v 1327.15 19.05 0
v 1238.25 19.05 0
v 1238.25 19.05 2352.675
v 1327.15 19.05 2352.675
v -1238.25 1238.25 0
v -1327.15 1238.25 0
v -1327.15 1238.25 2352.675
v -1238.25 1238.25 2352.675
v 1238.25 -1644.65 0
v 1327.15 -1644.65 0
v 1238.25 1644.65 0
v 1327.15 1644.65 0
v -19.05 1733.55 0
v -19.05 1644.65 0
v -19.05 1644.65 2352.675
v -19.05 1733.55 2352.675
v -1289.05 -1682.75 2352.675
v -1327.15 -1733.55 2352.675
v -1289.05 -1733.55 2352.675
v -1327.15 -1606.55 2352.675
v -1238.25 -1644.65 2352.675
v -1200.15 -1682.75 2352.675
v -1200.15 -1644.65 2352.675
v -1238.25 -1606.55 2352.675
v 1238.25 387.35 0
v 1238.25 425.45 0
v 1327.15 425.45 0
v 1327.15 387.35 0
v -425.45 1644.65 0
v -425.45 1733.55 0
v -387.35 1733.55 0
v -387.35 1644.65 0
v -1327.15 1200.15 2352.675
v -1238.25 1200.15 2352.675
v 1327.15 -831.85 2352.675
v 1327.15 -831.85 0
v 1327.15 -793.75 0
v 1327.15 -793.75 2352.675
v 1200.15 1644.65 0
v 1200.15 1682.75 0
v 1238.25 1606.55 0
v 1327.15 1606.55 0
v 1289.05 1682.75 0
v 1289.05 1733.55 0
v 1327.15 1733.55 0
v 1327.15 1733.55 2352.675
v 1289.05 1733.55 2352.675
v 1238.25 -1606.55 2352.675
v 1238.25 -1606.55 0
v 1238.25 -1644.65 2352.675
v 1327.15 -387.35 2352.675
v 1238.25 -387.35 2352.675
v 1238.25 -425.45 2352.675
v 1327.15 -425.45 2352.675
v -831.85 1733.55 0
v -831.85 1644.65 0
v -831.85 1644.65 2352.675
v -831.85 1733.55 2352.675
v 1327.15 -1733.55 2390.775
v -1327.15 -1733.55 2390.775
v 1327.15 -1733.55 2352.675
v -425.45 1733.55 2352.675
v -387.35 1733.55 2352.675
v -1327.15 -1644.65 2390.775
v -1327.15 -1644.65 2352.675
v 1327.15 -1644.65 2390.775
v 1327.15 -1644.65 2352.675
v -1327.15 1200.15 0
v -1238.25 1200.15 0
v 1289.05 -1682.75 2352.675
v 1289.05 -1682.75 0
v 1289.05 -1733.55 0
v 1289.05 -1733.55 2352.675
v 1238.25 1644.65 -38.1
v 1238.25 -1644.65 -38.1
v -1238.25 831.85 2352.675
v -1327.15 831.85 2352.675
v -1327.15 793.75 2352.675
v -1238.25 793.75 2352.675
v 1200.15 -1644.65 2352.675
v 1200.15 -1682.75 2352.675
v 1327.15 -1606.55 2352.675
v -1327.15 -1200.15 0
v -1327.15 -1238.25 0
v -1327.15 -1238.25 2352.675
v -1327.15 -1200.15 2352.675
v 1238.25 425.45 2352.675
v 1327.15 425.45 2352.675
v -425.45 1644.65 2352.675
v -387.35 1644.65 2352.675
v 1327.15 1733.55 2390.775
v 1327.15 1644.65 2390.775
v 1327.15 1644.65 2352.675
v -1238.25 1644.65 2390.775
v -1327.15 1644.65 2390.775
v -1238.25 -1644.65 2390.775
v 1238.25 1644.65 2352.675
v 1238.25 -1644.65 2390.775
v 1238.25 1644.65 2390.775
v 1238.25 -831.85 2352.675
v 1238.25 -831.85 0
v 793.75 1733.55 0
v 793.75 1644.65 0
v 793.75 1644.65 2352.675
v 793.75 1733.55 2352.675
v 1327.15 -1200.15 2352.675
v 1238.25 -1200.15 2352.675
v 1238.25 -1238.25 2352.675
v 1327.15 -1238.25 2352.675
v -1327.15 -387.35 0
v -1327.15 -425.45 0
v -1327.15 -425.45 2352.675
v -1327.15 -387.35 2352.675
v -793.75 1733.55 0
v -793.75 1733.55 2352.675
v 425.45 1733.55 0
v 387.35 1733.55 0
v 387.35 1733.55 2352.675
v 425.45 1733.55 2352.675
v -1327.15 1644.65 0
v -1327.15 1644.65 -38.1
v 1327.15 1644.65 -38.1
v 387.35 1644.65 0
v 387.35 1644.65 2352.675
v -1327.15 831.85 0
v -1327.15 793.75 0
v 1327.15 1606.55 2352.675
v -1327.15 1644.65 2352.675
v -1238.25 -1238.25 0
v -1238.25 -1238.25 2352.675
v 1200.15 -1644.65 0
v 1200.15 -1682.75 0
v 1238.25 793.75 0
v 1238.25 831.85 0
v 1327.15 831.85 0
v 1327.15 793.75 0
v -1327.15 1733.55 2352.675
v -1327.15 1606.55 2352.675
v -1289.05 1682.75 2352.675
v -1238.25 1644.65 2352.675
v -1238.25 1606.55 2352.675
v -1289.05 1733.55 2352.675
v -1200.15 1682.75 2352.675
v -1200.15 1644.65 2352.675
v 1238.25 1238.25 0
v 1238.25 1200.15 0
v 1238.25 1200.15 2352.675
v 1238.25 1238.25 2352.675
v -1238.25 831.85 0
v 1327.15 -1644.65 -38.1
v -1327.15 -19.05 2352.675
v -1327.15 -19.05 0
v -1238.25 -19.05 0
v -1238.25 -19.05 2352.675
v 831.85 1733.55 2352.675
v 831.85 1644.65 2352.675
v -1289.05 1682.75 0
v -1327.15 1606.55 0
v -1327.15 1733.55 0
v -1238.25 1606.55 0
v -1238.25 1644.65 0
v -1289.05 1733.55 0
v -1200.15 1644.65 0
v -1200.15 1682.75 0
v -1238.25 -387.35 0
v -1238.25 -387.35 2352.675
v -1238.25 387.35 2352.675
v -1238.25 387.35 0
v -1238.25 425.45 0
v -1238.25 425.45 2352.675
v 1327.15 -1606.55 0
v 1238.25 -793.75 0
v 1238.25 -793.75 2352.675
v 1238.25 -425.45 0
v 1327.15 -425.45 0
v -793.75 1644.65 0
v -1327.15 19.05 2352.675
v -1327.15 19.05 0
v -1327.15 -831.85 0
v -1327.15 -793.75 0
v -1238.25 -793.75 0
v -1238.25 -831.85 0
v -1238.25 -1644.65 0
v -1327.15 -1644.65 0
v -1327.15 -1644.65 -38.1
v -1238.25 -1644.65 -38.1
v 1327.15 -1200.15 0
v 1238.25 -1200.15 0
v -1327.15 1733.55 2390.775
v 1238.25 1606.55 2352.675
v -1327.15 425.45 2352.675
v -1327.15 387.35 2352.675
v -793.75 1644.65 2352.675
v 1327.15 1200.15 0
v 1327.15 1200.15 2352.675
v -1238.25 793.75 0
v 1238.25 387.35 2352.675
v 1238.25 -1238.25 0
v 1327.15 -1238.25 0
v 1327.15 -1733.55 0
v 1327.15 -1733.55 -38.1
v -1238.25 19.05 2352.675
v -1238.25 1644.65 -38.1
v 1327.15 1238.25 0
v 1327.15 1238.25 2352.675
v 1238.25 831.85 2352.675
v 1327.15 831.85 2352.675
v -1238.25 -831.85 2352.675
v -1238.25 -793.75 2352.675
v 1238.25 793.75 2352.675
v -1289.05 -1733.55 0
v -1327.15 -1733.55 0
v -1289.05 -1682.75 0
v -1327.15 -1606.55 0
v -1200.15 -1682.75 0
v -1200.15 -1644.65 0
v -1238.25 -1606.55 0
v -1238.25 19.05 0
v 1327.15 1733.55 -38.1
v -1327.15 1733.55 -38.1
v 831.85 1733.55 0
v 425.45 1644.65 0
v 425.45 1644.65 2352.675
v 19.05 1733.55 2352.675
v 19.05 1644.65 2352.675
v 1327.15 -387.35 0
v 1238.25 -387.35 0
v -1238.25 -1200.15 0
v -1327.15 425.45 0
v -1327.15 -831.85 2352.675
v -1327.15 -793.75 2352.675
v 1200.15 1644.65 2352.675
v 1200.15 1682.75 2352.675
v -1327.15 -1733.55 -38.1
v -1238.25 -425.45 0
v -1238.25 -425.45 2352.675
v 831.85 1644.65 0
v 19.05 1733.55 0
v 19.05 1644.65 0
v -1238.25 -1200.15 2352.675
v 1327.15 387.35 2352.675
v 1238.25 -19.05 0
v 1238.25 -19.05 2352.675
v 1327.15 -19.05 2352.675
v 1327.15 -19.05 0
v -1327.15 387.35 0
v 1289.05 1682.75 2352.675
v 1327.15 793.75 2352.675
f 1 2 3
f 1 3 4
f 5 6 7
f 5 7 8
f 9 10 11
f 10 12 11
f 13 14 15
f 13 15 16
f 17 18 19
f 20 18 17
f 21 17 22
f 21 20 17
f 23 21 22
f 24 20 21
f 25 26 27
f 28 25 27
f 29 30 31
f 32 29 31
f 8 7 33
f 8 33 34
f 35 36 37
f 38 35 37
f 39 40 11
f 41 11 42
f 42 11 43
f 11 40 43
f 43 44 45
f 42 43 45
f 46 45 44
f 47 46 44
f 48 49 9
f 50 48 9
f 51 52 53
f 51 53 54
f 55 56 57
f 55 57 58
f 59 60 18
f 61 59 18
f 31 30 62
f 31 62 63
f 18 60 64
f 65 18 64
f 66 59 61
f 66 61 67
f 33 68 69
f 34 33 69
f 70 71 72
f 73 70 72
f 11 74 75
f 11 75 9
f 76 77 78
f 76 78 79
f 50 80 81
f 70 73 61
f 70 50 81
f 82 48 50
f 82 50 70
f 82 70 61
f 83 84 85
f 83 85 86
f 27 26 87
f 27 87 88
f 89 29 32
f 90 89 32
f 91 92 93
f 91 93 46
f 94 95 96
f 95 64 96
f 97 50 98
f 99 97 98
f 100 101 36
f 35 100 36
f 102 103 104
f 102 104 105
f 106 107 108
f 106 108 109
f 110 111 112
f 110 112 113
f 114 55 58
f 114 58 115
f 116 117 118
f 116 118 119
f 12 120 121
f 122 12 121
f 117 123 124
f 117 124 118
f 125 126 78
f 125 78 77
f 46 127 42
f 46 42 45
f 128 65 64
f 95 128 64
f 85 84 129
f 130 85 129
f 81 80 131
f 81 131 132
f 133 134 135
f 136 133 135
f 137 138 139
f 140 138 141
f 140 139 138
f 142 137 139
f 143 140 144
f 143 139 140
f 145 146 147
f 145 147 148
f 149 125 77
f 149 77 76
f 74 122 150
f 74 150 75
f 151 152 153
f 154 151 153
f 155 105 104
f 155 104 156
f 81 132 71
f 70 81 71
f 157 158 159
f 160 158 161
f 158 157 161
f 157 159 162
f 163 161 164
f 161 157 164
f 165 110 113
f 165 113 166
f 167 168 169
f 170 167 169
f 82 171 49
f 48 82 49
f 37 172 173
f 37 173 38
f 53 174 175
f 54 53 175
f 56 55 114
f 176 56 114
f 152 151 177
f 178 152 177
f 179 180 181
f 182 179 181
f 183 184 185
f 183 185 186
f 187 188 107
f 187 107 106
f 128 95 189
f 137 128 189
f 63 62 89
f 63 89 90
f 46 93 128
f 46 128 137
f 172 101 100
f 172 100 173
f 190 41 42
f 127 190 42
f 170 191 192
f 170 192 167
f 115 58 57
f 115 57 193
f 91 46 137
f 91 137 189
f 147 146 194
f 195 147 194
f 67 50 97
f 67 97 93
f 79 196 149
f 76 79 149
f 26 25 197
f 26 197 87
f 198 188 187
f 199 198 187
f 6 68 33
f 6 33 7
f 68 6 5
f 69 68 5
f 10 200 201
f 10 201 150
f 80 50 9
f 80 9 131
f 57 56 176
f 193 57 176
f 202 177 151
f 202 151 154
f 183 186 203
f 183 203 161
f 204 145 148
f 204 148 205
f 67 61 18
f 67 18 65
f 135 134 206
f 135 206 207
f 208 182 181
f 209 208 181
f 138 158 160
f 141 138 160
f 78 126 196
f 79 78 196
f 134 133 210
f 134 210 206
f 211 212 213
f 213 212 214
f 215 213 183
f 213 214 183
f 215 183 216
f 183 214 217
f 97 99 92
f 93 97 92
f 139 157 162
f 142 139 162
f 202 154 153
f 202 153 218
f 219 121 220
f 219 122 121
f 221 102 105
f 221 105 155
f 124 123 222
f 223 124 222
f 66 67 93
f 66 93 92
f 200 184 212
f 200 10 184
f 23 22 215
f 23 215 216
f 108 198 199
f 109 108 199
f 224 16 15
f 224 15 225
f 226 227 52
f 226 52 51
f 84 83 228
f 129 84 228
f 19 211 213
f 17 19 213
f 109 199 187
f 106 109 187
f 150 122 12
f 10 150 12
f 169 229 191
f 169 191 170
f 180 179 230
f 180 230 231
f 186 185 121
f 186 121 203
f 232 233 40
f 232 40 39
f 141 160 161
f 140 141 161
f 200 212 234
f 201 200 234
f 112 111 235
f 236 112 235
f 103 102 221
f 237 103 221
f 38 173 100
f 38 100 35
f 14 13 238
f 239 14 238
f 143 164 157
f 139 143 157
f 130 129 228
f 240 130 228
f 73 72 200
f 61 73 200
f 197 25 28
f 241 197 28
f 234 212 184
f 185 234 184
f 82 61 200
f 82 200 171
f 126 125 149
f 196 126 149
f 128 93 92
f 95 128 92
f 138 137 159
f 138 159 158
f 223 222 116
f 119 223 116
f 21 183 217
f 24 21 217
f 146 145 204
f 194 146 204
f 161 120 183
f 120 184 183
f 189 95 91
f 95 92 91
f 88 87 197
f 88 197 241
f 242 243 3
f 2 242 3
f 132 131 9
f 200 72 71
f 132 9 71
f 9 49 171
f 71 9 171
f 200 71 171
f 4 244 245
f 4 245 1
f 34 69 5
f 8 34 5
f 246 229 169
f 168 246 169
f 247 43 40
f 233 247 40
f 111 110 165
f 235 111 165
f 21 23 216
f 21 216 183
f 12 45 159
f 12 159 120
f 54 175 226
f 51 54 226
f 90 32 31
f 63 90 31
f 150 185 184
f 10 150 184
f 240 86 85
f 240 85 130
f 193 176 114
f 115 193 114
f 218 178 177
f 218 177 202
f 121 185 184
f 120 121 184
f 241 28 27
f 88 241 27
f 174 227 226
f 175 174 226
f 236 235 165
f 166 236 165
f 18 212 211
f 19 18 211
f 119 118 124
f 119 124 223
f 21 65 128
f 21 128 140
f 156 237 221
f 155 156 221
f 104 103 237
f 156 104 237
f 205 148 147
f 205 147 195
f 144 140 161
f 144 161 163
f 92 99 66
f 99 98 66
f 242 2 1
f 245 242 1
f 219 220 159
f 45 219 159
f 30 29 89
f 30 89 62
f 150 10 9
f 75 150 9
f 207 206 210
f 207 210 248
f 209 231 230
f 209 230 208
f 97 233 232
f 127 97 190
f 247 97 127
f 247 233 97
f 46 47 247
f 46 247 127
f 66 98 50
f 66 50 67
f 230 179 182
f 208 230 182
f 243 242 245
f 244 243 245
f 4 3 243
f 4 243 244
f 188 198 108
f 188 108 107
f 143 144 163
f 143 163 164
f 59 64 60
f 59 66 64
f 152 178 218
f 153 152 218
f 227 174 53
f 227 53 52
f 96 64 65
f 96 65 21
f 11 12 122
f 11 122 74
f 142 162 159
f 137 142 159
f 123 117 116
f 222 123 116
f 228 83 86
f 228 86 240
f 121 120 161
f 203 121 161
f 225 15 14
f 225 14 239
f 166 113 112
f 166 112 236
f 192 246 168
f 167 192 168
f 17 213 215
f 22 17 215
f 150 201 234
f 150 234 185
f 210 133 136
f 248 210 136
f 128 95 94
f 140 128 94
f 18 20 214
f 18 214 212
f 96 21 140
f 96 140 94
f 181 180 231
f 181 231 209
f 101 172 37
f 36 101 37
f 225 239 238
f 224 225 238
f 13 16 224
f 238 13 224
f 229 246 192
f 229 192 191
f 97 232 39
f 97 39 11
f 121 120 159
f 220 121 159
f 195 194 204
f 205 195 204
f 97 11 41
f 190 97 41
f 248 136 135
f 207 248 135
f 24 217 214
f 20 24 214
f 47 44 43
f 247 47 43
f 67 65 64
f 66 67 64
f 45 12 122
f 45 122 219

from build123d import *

# Parameters (mm, degrees)
F1_DEPTH       = 2352.675
F0_W           = 38.1
F0_H           = 88.9
F0_W_2         = 88.9
F0_H_2         = 38.1
F2_W           = 88.9
F2_H           = 38.1
F3_DEPTH       = 3251.2
F3_DEPTH_BACK  = 38.1
F4_W           = 88.9
F4_H           = 38.1
F5_DEPTH       = 3251.2
F5_DEPTH_BACK  = 38.1
F7_DEPTH       = 2616.2
F7_DEPTH_BACK  = 38.1
F9_DEPTH       = 2616.2
F9_DEPTH_BACK  = 38.1
F10_W          = 88.9
F10_H          = 38.1
F11_DEPTH      = 3251.2
F11_DEPTH_BACK = 38.1
F12_W          = 88.9
F12_H          = 38.1
F13_DEPTH      = 3251.2
F13_DEPTH_BACK = 38.1
F15_DEPTH      = 2616.2
F15_DEPTH_BACK = 38.1
F16_W          = 88.9
F16_H          = 38.1
F17_DEPTH      = 2616.2
F17_DEPTH_BACK = 38.1


with BuildPart() as f1:
    # F0 (on Top) → F1 (new body)
    with BuildSketch(Plane.XY):
        Polygon((-1327.15, 1606.55), (-1238.25, 1606.55), (-1238.25, 1625.6), (-1238.25, 1644.65), (-1289.05, 1644.65), (-1327.15, 1644.65), align=None)
        Polygon((-1327.15, 1733.55), (-1327.15, 1644.65), (-1289.05, 1644.65), (-1289.05, 1682.75), (-1289.05, 1733.55), align=None)
        Polygon((-1289.05, 1644.65), (-1238.25, 1644.65), (-1200.15, 1644.65), (-1200.15, 1682.75), (-1289.05, 1682.75), align=None)
    extrude(amount=F1_DEPTH)


with BuildPart() as f1b:
    # F0 (on Top) → F1, piece 2 (new body)
    with BuildSketch(Plane.XY):
        with Locations((-812.8, 1689.1)):
            Rectangle(F0_W, F0_H)
    extrude(amount=F1_DEPTH)


with BuildPart() as f1c:
    # F0 (on Top) → F1, piece 3 (new body)
    with BuildSketch(Plane.XY):
        with Locations((-406.4, 1689.1)):
            Rectangle(F0_W, F0_H)
    extrude(amount=F1_DEPTH)


with BuildPart() as f1d:
    # F0 (on Top) → F1, piece 4 (new body)
    with BuildSketch(Plane.XY):
        with Locations((0, 1689.1)):
            Rectangle(F0_W, F0_H)
    extrude(amount=F1_DEPTH)


with BuildPart() as f1e:
    # F0 (on Top) → F1, piece 5 (new body)
    with BuildSketch(Plane.XY):
        with Locations((406.4, 1689.1)):
            Rectangle(F0_W, F0_H)
    extrude(amount=F1_DEPTH)


with BuildPart() as f1f:
    # F0 (on Top) → F1, piece 6 (new body)
    with BuildSketch(Plane.XY):
        Polygon((1200.15, 1644.65), (1238.25, 1644.65), (1282.7, 1644.65), (1289.05, 1644.65), (1289.05, 1682.75), (1200.15, 1682.75), align=None)
        Polygon((1289.05, 1644.65), (1327.15, 1644.65), (1327.15, 1733.55), (1289.05, 1733.55), (1289.05, 1682.75), align=None)
        Polygon((1238.25, 1644.65), (1238.25, 1606.55), (1327.15, 1606.55), (1327.15, 1644.65), (1289.05, 1644.65), (1282.7, 1644.65), align=None)
    extrude(amount=F1_DEPTH)


with BuildPart() as f1g:
    # F0 (on Top) → F1, piece 7 (new body)
    with BuildSketch(Plane.XY):
        with Locations((1282.7, 1219.2)):
            Rectangle(F0_W_2, F0_H_2)
    extrude(amount=F1_DEPTH)


with BuildPart() as f1h:
    # F0 (on Top) → F1, piece 8 (new body)
    with BuildSketch(Plane.XY):
        with Locations((1282.7, 812.8)):
            Rectangle(F0_W_2, F0_H_2)
    extrude(amount=F1_DEPTH)


with BuildPart() as f1i:
    # F0 (on Top) → F1, piece 9 (new body)
    with BuildSketch(Plane.XY):
        with Locations((1282.7, 406.4)):
            Rectangle(F0_W_2, F0_H_2)
    extrude(amount=F1_DEPTH)


with BuildPart() as f1j:
    # F0 (on Top) → F1, piece 10 (new body)
    with BuildSketch(Plane.XY):
        with Locations((1282.7, 0)):
            Rectangle(F0_W_2, F0_H_2)
    extrude(amount=F1_DEPTH)


with BuildPart() as f1k:
    # F0 (on Top) → F1, piece 11 (new body)
    with BuildSketch(Plane.XY):
        with Locations((1282.7, -406.4)):
            Rectangle(F0_W_2, F0_H_2)
    extrude(amount=F1_DEPTH)


with BuildPart() as f1l:
    # F0 (on Top) → F1, piece 12 (new body)
    with BuildSketch(Plane.XY):
        with Locations((1282.7, -812.8)):
            Rectangle(F0_W_2, F0_H_2)
    extrude(amount=F1_DEPTH)


with BuildPart() as f1m:
    # F0 (on Top) → F1, piece 13 (new body)
    with BuildSketch(Plane.XY):
        with Locations((1282.7, -1219.2)):
            Rectangle(F0_W_2, F0_H_2)
    extrude(amount=F1_DEPTH)


with BuildPart() as f1n:
    # F0 (on Top) → F1, piece 14 (new body)
    with BuildSketch(Plane.XY):
        Polygon((1238.25, -1606.55), (1238.25, -1644.65), (1289.05, -1644.65), (1327.15, -1644.65), (1327.15, -1606.55), align=None)
        Polygon((1289.05, -1644.65), (1238.25, -1644.65), (1200.15, -1644.65), (1200.15, -1682.75), (1289.05, -1682.75), align=None)
        Polygon((1327.15, -1644.65), (1289.05, -1644.65), (1289.05, -1682.75), (1289.05, -1733.55), (1327.15, -1733.55), align=None)
    extrude(amount=F1_DEPTH)


with BuildPart() as f1o:
    # F0 (on Top) → F1, piece 15 (new body)
    with BuildSketch(Plane.XY):
        Polygon((-1200.15, -1682.75), (-1200.15, -1644.65), (-1238.25, -1644.65), (-1289.05, -1644.65), (-1289.05, -1682.75), align=None)
        Polygon((-1289.05, -1682.75), (-1289.05, -1644.65), (-1327.15, -1644.65), (-1327.15, -1733.55), (-1289.05, -1733.55), align=None)
        Polygon((-1289.05, -1644.65), (-1238.25, -1644.65), (-1238.25, -1625.6), (-1238.25, -1606.55), (-1327.15, -1606.55), (-1327.15, -1644.65), align=None)
    extrude(amount=F1_DEPTH)


with BuildPart() as f1p:
    # F0 (on Top) → F1, piece 16 (new body)
    with BuildSketch(Plane.XY):
        with Locations((-1282.7, -1219.2)):
            Rectangle(F0_W_2, F0_H_2)
    extrude(amount=F1_DEPTH)


with BuildPart() as f1q:
    # F0 (on Top) → F1, piece 17 (new body)
    with BuildSketch(Plane.XY):
        with Locations((-1282.7, -812.8)):
            Rectangle(F0_W_2, F0_H_2)
    extrude(amount=F1_DEPTH)


with BuildPart() as f1r:
    # F0 (on Top) → F1, piece 18 (new body)
    with BuildSketch(Plane.XY):
        with Locations((-1282.7, -406.4)):
            Rectangle(F0_W_2, F0_H_2)
    extrude(amount=F1_DEPTH)


with BuildPart() as f1s:
    # F0 (on Top) → F1, piece 19 (new body)
    with BuildSketch(Plane.XY):
        with Locations((-1282.7, 0)):
            Rectangle(F0_W_2, F0_H_2)
    extrude(amount=F1_DEPTH)


with BuildPart() as f1t:
    # F0 (on Top) → F1, piece 20 (new body)
    with BuildSketch(Plane.XY):
        with Locations((-1282.7, 406.4)):
            Rectangle(F0_W_2, F0_H_2)
    extrude(amount=F1_DEPTH)


with BuildPart() as f1u:
    # F0 (on Top) → F1, piece 21 (new body)
    with BuildSketch(Plane.XY):
        with Locations((-1282.7, 812.8)):
            Rectangle(F0_W_2, F0_H_2)
    extrude(amount=F1_DEPTH)


with BuildPart() as f1v:
    # F0 (on Top) → F1, piece 22 (new body)
    with BuildSketch(Plane.XY):
        with Locations((-1282.7, 1219.2)):
            Rectangle(F0_W_2, F0_H_2)
    extrude(amount=F1_DEPTH)


with BuildPart() as f1w:
    # F0 (on Top) → F1, piece 23 (new body)
    with BuildSketch(Plane.XY):
        with Locations((812.8, 1689.1)):
            Rectangle(F0_W, F0_H)
    extrude(amount=F1_DEPTH)


with BuildPart() as f3:
    # F2 (on face) → F3 (new body, two sides)
    with BuildSketch(Plane(origin=(0, -1606.55, 0), x_dir=(-1, 0, 0), z_dir=(0, 1, 0))) as f3_sk:
        with Locations((-1282.7, -19.05)):
            Rectangle(F2_W, F2_H)
    extrude(amount=F3_DEPTH)
    extrude(f3_sk.sketch, amount=-F3_DEPTH_BACK)


with BuildPart() as f5:
    # F4 (on face) → F5 (new body, two sides)
    with BuildSketch(Plane.XZ.offset(-1606.55)) as f5_sk:
        with Locations((-1282.7, -19.05)):
            Rectangle(F4_W, F4_H)
    extrude(amount=F5_DEPTH)
    extrude(f5_sk.sketch, amount=-F5_DEPTH_BACK)


with BuildPart() as f7:
    # F6 (on face) → F7 (new body, two sides)
    with BuildSketch(Plane.YZ.offset(-1289.05)) as f7_sk:
        Polygon((-1682.75, 0), (-1733.55, 0), (-1733.55, -38.1), (-1644.65, -38.1), (-1644.65, 0), align=None)
    extrude(amount=F7_DEPTH)
    extrude(f7_sk.sketch, amount=-F7_DEPTH_BACK)


with BuildPart() as f9:
    # F8 (on face) → F9 (new body, two sides)
    with BuildSketch(Plane.YZ.offset(-1289.05)) as f9_sk:
        Polygon((1733.55, -38.1), (1733.55, 0), (1682.75, 0), (1644.65, 0), (1644.65, -38.1), align=None)
    extrude(amount=F9_DEPTH)
    extrude(f9_sk.sketch, amount=-F9_DEPTH_BACK)


with BuildPart() as f11:
    # F10 (on face) → F11 (new body, two sides)
    with BuildSketch(Plane.XZ.offset(-1606.55)) as f11_sk:
        with Locations((1282.7, 2371.725)):
            Rectangle(F10_W, F10_H)
    extrude(amount=F11_DEPTH)
    extrude(f11_sk.sketch, amount=-F11_DEPTH_BACK)


with BuildPart() as f13:
    # F12 (on face) → F13 (new body, two sides)
    with BuildSketch(Plane.XZ.offset(-1606.55)) as f13_sk:
        with Locations((-1282.7, 2371.725)):
            Rectangle(F12_W, F12_H)
    extrude(amount=F13_DEPTH)
    extrude(f13_sk.sketch, amount=-F13_DEPTH_BACK)


with BuildPart() as f15:
    # F14 (on face) → F15 (new body, two sides)
    with BuildSketch(Plane.YZ.offset(-1289.05)) as f15_sk:
        Polygon((-1733.55, 2390.775), (-1733.55, 2352.675), (-1682.75, 2352.675), (-1644.65, 2352.675), (-1644.65, 2390.775), align=None)
    extrude(amount=F15_DEPTH)
    extrude(f15_sk.sketch, amount=-F15_DEPTH_BACK)


with BuildPart() as f17:
    # F16 (on face) → F17 (new body, two sides)
    with BuildSketch(Plane.YZ.offset(-1289.05)) as f17_sk:
        with Locations((1689.1, 2371.725)):
            Rectangle(F16_W, F16_H)
    extrude(amount=F17_DEPTH)
    extrude(f17_sk.sketch, amount=-F17_DEPTH_BACK)


solid = Compound([f1.part, f1b.part, f1c.part, f1d.part, f1e.part, f1f.part, f1g.part, f1h.part, f1i.part, f1j.part, f1k.part, f1l.part, f1m.part, f1n.part, f1o.part, f1p.part, f1q.part, f1r.part, f1s.part, f1t.part, f1u.part, f1v.part, f1w.part, f3.part, f5.part, f7.part, f9.part, f11.part, f13.part, f15.part, f17.part])
